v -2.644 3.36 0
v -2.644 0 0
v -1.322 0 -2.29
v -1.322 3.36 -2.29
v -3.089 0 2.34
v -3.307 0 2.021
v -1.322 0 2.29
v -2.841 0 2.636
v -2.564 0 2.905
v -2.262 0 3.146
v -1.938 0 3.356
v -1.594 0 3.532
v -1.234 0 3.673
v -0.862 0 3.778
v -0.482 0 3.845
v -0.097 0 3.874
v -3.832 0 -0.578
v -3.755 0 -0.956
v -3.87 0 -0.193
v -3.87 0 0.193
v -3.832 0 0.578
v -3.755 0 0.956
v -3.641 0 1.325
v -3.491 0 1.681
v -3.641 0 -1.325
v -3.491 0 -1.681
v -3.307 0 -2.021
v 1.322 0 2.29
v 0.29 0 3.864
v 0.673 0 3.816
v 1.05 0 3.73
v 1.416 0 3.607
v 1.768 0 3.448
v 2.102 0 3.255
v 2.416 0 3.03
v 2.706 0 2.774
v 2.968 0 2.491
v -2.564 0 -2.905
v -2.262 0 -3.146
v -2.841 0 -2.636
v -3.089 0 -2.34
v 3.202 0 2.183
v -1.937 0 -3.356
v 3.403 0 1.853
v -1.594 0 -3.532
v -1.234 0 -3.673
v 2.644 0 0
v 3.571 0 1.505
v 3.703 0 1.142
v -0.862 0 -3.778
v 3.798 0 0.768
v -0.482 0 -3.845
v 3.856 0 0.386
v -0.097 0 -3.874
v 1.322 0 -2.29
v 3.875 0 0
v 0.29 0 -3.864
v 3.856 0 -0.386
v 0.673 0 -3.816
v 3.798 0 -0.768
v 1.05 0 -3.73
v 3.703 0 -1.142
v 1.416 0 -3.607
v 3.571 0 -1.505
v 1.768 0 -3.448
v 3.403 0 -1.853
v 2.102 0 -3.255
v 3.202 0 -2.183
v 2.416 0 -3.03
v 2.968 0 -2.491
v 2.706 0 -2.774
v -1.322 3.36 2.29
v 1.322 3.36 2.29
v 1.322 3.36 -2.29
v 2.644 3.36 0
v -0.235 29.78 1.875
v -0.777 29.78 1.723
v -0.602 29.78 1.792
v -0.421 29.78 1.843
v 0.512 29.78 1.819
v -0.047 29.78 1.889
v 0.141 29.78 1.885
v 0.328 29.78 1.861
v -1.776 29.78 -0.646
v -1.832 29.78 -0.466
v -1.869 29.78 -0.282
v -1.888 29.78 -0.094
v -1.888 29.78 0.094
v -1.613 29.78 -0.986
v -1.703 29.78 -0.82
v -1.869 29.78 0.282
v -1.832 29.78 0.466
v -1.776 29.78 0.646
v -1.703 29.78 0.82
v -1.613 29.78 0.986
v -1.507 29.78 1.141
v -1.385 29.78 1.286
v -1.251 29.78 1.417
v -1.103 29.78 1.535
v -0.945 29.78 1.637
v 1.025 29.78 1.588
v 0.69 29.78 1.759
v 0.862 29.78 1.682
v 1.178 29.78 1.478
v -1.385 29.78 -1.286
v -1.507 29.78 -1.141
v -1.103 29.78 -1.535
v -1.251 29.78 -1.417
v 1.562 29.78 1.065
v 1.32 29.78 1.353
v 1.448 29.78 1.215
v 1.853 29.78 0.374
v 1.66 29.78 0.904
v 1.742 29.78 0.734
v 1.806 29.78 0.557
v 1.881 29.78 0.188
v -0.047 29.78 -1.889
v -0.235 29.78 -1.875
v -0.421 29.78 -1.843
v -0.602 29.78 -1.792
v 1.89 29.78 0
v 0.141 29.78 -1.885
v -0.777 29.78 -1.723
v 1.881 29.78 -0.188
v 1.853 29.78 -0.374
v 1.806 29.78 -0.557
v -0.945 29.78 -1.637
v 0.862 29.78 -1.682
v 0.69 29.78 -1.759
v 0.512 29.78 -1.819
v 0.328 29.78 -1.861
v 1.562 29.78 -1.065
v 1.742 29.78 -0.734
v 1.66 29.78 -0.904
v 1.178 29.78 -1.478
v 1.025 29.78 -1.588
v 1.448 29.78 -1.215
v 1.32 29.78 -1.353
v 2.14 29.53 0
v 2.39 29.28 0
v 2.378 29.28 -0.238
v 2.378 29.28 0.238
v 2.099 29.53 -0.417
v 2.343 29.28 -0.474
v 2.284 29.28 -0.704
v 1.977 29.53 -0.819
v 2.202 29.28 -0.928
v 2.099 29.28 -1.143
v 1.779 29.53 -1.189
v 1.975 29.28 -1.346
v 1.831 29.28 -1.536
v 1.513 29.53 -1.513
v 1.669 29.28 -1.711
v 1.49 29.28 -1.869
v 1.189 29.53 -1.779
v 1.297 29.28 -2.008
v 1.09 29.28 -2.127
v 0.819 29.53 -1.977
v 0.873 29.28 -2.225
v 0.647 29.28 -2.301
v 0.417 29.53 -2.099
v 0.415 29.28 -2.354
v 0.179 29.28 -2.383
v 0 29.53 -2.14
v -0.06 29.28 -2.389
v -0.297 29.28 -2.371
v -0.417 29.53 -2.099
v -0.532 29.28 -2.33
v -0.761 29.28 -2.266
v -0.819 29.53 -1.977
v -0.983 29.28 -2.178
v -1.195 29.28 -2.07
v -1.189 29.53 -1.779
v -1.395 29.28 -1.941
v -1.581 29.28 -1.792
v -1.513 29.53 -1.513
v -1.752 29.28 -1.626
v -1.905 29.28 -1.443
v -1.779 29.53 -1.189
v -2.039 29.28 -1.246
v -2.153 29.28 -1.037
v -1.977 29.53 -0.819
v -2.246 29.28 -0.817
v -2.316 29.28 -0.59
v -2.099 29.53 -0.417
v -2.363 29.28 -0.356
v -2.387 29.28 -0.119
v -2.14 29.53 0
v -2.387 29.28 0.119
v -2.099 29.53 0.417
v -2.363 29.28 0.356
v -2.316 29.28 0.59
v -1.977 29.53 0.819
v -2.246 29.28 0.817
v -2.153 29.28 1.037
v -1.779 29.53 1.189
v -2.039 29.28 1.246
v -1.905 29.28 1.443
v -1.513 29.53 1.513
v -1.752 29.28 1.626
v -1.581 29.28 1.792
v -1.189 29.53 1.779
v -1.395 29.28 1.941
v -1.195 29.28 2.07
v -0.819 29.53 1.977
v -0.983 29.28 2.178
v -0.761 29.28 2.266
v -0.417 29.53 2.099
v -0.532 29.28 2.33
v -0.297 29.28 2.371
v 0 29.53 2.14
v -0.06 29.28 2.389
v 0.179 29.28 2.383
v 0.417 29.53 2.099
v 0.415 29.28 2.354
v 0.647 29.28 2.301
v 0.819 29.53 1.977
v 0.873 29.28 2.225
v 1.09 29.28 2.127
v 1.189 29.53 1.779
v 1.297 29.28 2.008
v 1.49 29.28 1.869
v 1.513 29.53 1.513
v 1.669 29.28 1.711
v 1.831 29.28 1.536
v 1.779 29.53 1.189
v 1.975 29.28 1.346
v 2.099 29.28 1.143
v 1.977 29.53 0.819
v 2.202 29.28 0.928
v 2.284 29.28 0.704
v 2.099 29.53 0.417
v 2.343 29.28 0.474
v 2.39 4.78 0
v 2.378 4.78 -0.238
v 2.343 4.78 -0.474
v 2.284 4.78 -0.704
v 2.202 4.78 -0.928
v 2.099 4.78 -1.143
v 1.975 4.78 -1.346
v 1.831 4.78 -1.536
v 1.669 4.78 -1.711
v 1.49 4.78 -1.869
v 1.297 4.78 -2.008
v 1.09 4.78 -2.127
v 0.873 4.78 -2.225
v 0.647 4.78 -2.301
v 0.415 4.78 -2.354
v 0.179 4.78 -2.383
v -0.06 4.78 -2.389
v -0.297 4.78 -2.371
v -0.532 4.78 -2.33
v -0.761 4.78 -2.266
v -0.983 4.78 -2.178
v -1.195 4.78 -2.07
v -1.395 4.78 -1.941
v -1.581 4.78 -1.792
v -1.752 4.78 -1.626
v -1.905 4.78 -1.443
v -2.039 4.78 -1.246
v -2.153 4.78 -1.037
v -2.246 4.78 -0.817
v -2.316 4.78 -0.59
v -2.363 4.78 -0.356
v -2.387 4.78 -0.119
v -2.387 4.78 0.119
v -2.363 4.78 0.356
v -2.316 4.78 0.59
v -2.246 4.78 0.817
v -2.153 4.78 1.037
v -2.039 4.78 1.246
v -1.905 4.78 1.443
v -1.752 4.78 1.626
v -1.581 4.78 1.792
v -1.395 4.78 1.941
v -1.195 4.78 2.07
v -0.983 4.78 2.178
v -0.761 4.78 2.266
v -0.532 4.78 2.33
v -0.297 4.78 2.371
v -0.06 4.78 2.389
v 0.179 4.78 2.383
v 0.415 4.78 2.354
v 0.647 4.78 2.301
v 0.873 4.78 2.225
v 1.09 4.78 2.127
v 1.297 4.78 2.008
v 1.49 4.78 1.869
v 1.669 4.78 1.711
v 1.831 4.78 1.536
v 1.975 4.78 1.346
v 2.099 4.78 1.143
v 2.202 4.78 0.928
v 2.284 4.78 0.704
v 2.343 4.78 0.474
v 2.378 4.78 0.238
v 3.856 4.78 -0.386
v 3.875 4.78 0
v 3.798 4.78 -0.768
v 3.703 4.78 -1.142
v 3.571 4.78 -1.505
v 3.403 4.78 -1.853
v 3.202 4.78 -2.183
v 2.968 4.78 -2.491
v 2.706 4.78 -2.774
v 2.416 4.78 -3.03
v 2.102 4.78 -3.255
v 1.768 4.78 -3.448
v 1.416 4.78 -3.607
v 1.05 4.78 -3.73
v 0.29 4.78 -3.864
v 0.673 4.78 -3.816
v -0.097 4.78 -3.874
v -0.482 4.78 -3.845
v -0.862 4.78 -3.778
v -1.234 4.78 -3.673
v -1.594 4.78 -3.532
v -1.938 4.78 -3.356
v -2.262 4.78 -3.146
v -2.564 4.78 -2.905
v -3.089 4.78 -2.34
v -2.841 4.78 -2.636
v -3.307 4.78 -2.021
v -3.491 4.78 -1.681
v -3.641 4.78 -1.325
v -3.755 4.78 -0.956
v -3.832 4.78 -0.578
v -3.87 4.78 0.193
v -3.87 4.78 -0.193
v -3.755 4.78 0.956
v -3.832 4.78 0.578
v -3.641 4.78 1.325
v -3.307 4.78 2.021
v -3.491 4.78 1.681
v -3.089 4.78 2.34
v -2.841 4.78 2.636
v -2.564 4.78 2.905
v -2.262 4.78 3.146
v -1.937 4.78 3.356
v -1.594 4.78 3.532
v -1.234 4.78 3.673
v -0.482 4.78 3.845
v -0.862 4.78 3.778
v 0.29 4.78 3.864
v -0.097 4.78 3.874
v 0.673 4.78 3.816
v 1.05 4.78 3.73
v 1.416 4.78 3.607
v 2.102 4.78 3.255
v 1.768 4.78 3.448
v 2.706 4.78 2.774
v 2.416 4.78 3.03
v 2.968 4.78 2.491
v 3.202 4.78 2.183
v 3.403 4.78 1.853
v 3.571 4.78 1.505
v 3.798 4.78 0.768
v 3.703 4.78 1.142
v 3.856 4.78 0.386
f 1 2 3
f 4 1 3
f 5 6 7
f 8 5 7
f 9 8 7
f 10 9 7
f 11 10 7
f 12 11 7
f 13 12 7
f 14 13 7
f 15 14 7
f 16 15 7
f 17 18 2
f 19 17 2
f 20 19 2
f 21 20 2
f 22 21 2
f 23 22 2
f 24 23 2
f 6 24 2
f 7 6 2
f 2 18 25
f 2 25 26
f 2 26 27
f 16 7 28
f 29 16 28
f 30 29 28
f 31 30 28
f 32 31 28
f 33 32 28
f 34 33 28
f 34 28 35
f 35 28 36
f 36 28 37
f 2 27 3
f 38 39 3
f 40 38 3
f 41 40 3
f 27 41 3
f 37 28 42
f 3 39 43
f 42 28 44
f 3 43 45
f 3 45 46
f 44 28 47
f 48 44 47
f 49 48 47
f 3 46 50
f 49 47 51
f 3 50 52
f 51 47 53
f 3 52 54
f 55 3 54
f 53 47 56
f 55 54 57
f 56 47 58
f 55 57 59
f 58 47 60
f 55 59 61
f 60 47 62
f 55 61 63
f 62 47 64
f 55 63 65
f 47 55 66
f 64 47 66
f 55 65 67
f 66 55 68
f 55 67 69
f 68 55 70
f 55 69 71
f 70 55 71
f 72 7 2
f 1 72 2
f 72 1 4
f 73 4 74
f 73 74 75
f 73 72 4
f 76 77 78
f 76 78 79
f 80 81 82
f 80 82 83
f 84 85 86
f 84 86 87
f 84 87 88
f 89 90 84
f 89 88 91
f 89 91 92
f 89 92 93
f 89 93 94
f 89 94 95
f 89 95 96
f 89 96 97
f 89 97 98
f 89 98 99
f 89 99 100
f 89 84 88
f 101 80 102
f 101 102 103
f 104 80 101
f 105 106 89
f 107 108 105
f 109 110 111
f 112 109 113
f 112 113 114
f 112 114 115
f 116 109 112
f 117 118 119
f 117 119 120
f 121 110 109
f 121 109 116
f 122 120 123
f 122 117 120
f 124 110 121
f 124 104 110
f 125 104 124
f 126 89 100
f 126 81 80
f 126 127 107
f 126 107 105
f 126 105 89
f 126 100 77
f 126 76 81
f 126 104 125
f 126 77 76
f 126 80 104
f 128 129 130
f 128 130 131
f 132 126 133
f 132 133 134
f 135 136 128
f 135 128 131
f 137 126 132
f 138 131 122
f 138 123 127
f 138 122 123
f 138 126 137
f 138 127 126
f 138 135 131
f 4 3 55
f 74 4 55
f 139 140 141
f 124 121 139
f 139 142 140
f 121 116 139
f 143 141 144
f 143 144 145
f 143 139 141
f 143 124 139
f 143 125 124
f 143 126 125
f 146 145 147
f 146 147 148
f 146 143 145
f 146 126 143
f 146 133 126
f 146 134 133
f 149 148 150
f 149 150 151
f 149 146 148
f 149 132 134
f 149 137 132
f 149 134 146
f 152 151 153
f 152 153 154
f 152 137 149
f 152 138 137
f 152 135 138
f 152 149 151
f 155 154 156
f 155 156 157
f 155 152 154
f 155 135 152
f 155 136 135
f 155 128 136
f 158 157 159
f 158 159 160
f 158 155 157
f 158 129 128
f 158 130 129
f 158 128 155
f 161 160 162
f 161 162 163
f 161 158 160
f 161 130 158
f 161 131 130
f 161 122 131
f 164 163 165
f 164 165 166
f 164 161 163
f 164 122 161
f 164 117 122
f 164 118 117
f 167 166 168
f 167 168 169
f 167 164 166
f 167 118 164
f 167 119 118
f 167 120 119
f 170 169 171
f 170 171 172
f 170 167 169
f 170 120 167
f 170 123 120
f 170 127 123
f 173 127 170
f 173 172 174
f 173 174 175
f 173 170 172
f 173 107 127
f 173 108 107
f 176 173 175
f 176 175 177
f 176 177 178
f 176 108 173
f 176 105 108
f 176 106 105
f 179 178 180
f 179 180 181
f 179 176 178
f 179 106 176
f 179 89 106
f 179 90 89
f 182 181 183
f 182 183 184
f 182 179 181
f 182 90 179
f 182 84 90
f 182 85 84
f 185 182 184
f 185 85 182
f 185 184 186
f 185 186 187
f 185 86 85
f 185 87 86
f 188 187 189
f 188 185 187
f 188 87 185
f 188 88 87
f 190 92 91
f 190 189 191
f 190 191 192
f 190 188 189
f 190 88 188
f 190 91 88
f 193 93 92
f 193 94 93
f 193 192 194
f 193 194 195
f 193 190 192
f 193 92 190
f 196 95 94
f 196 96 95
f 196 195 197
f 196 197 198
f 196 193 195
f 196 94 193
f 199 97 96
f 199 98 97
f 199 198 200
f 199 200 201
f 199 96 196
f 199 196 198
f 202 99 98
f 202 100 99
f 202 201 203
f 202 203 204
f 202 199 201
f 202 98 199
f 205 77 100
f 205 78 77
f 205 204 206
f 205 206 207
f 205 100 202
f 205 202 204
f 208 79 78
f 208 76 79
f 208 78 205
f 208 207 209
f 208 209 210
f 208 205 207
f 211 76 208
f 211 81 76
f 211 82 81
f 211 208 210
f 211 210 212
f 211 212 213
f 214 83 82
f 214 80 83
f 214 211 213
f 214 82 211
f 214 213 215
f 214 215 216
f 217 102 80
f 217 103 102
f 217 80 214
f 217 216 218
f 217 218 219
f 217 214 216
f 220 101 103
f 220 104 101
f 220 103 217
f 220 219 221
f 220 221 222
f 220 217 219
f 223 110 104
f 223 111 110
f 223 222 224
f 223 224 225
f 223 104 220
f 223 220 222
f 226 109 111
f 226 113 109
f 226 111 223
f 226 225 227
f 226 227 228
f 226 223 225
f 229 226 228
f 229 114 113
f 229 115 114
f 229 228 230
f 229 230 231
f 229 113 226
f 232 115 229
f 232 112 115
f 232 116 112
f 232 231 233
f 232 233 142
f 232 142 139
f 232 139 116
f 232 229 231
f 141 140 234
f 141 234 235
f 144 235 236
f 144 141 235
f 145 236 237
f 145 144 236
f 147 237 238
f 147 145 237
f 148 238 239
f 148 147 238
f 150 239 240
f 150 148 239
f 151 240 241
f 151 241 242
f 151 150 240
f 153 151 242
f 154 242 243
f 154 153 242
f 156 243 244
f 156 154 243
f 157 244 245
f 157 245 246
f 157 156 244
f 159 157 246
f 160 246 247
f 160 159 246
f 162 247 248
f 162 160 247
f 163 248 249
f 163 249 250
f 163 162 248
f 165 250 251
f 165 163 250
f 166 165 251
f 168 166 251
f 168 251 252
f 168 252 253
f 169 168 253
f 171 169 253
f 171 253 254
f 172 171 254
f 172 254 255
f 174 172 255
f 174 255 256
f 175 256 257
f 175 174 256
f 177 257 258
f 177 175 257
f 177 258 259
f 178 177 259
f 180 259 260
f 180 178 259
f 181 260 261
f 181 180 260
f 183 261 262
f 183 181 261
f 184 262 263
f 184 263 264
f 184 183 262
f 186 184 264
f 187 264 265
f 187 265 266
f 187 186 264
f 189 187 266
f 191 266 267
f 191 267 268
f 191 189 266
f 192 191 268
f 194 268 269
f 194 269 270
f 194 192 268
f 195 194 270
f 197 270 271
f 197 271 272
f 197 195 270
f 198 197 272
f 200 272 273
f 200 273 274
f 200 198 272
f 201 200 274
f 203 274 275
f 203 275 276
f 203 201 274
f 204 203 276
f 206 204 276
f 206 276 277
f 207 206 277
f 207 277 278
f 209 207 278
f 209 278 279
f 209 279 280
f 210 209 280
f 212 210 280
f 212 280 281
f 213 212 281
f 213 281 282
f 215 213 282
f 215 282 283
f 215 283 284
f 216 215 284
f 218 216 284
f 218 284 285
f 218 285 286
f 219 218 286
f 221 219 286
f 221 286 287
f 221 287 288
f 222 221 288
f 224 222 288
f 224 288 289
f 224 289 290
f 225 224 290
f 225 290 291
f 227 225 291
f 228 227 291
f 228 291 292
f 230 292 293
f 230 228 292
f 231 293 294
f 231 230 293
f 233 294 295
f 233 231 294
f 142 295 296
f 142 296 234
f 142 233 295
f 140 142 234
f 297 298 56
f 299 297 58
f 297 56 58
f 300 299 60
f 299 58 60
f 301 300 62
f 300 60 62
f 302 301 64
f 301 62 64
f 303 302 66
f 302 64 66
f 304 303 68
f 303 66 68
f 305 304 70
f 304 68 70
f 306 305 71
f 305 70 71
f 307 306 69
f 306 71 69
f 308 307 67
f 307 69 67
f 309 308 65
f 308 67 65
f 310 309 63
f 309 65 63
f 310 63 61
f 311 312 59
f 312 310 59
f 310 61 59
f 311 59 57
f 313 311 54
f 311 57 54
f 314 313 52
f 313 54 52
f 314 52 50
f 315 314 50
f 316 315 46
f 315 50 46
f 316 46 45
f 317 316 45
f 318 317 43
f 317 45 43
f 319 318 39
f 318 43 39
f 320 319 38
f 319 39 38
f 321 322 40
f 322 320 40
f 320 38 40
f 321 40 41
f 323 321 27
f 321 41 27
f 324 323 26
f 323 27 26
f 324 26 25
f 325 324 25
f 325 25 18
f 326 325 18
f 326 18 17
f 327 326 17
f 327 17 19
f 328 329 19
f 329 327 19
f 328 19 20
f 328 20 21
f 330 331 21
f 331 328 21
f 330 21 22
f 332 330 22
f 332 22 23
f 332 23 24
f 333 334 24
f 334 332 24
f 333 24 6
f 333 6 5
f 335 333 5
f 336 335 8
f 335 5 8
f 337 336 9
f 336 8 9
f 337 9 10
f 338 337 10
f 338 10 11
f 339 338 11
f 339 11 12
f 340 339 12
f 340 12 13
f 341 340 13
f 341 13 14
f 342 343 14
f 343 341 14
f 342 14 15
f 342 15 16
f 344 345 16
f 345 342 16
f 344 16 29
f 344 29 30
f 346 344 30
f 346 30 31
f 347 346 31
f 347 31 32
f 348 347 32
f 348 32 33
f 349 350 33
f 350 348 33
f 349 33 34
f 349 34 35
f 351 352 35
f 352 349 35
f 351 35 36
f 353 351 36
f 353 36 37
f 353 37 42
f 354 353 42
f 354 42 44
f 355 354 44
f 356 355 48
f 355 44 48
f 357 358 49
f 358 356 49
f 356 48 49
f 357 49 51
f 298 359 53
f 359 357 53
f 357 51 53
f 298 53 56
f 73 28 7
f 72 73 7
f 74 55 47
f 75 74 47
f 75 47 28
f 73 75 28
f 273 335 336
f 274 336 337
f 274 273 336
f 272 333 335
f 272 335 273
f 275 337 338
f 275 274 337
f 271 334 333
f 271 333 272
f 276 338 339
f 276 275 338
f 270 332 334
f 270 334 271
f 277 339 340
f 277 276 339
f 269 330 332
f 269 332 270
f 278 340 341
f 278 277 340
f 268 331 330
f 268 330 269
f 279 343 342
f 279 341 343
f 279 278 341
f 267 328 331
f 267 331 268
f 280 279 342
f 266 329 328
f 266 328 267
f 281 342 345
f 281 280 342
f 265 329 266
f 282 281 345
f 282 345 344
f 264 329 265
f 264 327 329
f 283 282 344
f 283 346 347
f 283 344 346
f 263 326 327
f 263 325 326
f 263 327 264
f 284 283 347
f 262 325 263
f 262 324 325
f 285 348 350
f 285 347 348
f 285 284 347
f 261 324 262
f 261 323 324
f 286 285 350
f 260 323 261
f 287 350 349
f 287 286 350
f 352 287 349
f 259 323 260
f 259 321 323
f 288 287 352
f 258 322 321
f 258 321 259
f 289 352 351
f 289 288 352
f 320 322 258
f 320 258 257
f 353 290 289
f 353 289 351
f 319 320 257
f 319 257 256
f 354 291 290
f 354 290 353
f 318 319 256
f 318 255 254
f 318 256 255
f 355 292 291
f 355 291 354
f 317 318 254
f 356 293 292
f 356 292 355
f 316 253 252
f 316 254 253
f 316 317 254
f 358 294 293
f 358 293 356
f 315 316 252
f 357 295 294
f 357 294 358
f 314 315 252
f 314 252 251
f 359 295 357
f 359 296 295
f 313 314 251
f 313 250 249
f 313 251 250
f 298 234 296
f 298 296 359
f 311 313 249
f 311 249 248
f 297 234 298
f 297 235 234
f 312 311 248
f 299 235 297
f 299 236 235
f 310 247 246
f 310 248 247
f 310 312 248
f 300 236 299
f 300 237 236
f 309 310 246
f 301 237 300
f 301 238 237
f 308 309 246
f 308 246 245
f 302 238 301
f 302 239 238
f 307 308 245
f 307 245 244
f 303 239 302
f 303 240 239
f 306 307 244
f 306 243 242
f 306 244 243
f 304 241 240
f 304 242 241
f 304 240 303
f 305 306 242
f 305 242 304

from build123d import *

# Parameters (mm, degrees)
SKETCH1_R           = 3.875
BOSS_EXTRUDE1_DEPTH = 29.78
SKETCH2_OUTSIDE_W   = 16.096
SKETCH2_OUTSIDE_H   = 16.096
SKETCH2_OUTSIDE_R   = 2.39
CUT_EXTRUDE1_DEPTH  = 25
CHAMFER1_SIZE       = 0.5
CUT_EXTRUDE2_DEPTH  = 3.36


with BuildPart() as part:
    # Sketch1 → Boss-Extrude1 (new body)
    with BuildSketch(Plane(origin=(0, 0, 0), x_dir=(1, 0, 0), z_dir=(0, 1, 0))):
        Circle(SKETCH1_R)
    extrude(amount=BOSS_EXTRUDE1_DEPTH)

    # Sketch2 outside → Cut-Extrude1 (cut)
    with BuildSketch(Plane(origin=(0, 29.78, 0), x_dir=(1, 0, 0), z_dir=(0, 1, 0))):
        Rectangle(SKETCH2_OUTSIDE_W, SKETCH2_OUTSIDE_H)
        Circle(SKETCH2_OUTSIDE_R, mode=Mode.SUBTRACT)
    extrude(amount=-CUT_EXTRUDE1_DEPTH, mode=Mode.SUBTRACT)

    # Chamfer1
    chamfer1_edges = [part.edges().sort_by_distance(p)[0] for p in [
        (-2.39, 29.78, 0),
    ]]
    chamfer(chamfer1_edges, length=CHAMFER1_SIZE)

    # Sketch8 → Cut-Extrude2 (cut)
    with BuildSketch(Plane.XZ):
        Polygon((2.644264233, 0), (1.322132116, 2.29), (-1.322132116, 2.29), (-2.644264233, 0), (-1.322132116, -2.29), (1.322132116, -2.29), align=None)
    extrude(amount=-CUT_EXTRUDE2_DEPTH, mode=Mode.SUBTRACT)


solid = part.part
